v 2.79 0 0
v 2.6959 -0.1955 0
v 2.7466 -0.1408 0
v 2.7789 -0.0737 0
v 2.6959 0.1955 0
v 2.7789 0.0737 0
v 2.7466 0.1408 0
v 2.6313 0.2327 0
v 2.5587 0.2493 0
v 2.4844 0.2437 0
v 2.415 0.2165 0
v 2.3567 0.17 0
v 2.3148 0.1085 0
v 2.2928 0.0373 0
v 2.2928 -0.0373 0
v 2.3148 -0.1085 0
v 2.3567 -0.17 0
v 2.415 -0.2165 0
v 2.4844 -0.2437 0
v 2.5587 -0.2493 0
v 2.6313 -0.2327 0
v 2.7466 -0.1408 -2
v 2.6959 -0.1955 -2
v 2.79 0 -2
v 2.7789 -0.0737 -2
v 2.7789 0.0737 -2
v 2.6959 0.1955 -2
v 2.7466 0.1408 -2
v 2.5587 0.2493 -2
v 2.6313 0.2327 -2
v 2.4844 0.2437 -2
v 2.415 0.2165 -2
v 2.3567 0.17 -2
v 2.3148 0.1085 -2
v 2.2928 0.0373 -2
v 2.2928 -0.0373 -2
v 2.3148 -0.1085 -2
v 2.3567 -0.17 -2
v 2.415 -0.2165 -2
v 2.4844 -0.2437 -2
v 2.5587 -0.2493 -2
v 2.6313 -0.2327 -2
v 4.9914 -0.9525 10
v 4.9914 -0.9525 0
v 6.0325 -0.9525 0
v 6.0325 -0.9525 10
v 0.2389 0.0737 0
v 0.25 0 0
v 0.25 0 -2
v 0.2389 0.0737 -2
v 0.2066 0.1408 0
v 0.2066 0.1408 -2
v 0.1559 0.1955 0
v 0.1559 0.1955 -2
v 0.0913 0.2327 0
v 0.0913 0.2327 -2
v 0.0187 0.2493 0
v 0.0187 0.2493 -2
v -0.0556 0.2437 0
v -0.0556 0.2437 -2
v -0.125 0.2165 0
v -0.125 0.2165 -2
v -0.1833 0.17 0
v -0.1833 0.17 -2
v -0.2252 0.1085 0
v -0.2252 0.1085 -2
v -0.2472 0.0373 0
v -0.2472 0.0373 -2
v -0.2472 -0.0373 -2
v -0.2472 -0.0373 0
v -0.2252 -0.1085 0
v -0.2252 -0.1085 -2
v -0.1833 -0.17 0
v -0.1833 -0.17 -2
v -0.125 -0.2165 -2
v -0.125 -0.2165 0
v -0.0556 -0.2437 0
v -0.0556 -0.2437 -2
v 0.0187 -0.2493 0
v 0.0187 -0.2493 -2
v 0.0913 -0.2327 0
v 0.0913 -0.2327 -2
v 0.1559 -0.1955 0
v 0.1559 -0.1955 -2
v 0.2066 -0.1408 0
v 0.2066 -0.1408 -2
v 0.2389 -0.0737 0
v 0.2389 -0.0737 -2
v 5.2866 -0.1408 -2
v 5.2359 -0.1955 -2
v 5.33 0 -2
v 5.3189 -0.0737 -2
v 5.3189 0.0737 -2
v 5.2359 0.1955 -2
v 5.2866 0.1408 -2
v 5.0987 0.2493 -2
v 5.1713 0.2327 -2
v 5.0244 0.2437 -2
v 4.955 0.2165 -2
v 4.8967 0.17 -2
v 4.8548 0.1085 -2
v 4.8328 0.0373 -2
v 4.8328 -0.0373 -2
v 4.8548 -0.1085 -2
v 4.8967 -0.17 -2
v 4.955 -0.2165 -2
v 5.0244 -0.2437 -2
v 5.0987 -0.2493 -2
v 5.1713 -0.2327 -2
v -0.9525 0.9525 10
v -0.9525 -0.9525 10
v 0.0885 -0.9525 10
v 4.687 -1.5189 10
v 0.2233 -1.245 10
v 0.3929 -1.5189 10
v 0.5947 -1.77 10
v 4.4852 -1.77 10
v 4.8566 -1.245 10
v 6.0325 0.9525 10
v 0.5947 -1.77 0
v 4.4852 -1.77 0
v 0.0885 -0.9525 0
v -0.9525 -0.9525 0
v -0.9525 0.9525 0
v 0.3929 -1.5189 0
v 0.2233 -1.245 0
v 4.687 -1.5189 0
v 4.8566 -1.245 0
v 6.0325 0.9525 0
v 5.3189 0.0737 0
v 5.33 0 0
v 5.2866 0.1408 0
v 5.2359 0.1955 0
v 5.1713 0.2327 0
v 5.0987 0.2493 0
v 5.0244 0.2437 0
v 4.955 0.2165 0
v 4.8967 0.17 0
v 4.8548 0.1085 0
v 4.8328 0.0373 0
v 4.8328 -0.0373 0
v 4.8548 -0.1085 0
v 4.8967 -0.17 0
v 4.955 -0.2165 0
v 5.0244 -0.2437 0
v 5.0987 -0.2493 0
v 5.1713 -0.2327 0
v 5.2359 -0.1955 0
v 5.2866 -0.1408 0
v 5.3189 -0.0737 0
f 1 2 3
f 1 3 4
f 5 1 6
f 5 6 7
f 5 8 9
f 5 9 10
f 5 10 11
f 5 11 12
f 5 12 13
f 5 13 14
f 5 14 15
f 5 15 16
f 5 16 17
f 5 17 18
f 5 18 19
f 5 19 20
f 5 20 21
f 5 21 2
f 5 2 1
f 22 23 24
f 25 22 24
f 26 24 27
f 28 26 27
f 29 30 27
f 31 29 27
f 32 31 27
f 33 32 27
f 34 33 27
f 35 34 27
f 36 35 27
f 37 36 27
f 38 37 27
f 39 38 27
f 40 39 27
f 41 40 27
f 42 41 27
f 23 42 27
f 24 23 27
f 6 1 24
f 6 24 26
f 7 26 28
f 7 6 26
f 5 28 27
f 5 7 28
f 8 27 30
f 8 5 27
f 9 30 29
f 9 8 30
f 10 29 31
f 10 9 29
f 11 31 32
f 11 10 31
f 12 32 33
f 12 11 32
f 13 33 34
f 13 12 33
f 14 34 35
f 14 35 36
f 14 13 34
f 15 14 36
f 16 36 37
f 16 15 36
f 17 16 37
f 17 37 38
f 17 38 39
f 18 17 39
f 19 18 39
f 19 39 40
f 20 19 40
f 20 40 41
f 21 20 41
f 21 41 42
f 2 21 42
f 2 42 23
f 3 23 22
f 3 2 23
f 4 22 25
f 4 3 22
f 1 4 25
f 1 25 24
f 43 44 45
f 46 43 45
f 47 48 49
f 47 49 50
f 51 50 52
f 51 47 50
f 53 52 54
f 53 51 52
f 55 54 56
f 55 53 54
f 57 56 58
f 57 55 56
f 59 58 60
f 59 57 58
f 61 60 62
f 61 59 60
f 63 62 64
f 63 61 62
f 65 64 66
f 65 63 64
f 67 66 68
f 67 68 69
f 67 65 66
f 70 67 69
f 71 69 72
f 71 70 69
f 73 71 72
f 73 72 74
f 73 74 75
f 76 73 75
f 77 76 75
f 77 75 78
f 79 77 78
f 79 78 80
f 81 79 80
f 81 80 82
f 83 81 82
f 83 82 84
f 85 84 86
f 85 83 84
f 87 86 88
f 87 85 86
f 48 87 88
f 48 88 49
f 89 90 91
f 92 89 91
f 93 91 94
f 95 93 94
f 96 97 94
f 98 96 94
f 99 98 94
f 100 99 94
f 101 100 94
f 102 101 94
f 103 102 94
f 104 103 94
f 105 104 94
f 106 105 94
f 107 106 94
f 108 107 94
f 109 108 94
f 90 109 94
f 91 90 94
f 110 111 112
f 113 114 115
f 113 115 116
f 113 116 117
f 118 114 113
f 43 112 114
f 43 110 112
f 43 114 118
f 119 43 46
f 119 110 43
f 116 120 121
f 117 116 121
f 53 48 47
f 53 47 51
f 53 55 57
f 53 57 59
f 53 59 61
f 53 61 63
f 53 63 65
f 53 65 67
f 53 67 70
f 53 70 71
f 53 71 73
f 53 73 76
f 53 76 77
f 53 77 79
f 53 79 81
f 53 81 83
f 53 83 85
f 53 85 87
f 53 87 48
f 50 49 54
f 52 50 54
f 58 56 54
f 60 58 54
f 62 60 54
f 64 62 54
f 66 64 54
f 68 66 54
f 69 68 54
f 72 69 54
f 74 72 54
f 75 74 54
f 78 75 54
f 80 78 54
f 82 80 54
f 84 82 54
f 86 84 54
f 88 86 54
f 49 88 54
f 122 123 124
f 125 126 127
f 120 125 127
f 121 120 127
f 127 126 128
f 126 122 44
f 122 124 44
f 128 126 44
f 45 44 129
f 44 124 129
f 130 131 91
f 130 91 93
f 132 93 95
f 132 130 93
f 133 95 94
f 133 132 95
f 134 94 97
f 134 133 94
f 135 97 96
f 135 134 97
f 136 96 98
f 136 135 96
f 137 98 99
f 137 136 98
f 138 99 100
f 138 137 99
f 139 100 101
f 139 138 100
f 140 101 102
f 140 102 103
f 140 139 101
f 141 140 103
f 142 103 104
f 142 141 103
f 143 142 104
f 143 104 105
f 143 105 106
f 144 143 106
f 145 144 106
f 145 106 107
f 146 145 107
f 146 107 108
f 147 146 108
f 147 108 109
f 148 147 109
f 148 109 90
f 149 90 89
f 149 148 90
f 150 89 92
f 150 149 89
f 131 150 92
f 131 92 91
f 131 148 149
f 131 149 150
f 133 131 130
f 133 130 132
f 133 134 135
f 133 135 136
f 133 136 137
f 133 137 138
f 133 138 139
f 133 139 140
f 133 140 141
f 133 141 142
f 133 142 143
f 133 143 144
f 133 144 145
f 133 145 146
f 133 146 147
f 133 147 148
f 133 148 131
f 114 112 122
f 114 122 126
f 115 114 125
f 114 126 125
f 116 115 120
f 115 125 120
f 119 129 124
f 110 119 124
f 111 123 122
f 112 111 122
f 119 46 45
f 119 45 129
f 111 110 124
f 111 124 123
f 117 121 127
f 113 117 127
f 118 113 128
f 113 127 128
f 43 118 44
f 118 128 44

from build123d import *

# Parameters (mm, degrees)
COMPONENT_OUTLINE_DEPTH = 10
SKETCH2_R               = 0.25
EXTRUDE_1_DEPTH         = 2
SKETCH3_R               = 0.25
EXTRUDE_2_DEPTH         = 2
SKETCH4_R               = 0.25
EXTRUDE_3_DEPTH         = 2


with BuildPart() as part:
    # Sketch1 → Component_Outline (new body)
    with BuildSketch(Plane.XY):
        with BuildLine():
            Line((0.0885, 0.9525), (-0.9525, 0.9525))
            Line((-0.9525, 0.9525), (-0.9525, -0.9525))
            Line((-0.9525, -0.9525), (0.0885, -0.9525))
            ThreePointArc((0.0885, -0.9525), (0.303922623, -1.384580016), (0.5947, -1.77))
            Line((0.5947, -1.77), (4.4852, -1.77))
            ThreePointArc((4.4852, -1.77), (4.775977377, -1.384580016), (4.9914, -0.9525))
            Line((4.9914, -0.9525), (6.0325, -0.9525))
            Line((6.0325, -0.9525), (6.0325, 0.9525))
            Line((6.0325, 0.9525), (4.9914, 0.9525))
            Line((4.9914, 0.9525), (0.0885, 0.9525))
        make_face()
    extrude(amount=COMPONENT_OUTLINE_DEPTH)


with BuildPart() as body_2:
    # Sketch2 → Extrude 1 (new body)
    with BuildSketch(Plane.XY):
        Circle(SKETCH2_R)
    extrude(amount=-EXTRUDE_1_DEPTH)


with BuildPart() as body_3:
    # Sketch3 → Extrude 2 (new body)
    with BuildSketch(Plane.XY):
        with Locations((2.54, 0)):
            Circle(SKETCH3_R)
    extrude(amount=-EXTRUDE_2_DEPTH)


with BuildPart() as body_4:
    # Sketch4 → Extrude 3 (new body)
    with BuildSketch(Plane.XY):
        with Locations((5.08, 0)):
            Circle(SKETCH4_R)
    extrude(amount=-EXTRUDE_3_DEPTH)


solid = Compound([part.part, body_2.part, body_3.part, body_4.part])
